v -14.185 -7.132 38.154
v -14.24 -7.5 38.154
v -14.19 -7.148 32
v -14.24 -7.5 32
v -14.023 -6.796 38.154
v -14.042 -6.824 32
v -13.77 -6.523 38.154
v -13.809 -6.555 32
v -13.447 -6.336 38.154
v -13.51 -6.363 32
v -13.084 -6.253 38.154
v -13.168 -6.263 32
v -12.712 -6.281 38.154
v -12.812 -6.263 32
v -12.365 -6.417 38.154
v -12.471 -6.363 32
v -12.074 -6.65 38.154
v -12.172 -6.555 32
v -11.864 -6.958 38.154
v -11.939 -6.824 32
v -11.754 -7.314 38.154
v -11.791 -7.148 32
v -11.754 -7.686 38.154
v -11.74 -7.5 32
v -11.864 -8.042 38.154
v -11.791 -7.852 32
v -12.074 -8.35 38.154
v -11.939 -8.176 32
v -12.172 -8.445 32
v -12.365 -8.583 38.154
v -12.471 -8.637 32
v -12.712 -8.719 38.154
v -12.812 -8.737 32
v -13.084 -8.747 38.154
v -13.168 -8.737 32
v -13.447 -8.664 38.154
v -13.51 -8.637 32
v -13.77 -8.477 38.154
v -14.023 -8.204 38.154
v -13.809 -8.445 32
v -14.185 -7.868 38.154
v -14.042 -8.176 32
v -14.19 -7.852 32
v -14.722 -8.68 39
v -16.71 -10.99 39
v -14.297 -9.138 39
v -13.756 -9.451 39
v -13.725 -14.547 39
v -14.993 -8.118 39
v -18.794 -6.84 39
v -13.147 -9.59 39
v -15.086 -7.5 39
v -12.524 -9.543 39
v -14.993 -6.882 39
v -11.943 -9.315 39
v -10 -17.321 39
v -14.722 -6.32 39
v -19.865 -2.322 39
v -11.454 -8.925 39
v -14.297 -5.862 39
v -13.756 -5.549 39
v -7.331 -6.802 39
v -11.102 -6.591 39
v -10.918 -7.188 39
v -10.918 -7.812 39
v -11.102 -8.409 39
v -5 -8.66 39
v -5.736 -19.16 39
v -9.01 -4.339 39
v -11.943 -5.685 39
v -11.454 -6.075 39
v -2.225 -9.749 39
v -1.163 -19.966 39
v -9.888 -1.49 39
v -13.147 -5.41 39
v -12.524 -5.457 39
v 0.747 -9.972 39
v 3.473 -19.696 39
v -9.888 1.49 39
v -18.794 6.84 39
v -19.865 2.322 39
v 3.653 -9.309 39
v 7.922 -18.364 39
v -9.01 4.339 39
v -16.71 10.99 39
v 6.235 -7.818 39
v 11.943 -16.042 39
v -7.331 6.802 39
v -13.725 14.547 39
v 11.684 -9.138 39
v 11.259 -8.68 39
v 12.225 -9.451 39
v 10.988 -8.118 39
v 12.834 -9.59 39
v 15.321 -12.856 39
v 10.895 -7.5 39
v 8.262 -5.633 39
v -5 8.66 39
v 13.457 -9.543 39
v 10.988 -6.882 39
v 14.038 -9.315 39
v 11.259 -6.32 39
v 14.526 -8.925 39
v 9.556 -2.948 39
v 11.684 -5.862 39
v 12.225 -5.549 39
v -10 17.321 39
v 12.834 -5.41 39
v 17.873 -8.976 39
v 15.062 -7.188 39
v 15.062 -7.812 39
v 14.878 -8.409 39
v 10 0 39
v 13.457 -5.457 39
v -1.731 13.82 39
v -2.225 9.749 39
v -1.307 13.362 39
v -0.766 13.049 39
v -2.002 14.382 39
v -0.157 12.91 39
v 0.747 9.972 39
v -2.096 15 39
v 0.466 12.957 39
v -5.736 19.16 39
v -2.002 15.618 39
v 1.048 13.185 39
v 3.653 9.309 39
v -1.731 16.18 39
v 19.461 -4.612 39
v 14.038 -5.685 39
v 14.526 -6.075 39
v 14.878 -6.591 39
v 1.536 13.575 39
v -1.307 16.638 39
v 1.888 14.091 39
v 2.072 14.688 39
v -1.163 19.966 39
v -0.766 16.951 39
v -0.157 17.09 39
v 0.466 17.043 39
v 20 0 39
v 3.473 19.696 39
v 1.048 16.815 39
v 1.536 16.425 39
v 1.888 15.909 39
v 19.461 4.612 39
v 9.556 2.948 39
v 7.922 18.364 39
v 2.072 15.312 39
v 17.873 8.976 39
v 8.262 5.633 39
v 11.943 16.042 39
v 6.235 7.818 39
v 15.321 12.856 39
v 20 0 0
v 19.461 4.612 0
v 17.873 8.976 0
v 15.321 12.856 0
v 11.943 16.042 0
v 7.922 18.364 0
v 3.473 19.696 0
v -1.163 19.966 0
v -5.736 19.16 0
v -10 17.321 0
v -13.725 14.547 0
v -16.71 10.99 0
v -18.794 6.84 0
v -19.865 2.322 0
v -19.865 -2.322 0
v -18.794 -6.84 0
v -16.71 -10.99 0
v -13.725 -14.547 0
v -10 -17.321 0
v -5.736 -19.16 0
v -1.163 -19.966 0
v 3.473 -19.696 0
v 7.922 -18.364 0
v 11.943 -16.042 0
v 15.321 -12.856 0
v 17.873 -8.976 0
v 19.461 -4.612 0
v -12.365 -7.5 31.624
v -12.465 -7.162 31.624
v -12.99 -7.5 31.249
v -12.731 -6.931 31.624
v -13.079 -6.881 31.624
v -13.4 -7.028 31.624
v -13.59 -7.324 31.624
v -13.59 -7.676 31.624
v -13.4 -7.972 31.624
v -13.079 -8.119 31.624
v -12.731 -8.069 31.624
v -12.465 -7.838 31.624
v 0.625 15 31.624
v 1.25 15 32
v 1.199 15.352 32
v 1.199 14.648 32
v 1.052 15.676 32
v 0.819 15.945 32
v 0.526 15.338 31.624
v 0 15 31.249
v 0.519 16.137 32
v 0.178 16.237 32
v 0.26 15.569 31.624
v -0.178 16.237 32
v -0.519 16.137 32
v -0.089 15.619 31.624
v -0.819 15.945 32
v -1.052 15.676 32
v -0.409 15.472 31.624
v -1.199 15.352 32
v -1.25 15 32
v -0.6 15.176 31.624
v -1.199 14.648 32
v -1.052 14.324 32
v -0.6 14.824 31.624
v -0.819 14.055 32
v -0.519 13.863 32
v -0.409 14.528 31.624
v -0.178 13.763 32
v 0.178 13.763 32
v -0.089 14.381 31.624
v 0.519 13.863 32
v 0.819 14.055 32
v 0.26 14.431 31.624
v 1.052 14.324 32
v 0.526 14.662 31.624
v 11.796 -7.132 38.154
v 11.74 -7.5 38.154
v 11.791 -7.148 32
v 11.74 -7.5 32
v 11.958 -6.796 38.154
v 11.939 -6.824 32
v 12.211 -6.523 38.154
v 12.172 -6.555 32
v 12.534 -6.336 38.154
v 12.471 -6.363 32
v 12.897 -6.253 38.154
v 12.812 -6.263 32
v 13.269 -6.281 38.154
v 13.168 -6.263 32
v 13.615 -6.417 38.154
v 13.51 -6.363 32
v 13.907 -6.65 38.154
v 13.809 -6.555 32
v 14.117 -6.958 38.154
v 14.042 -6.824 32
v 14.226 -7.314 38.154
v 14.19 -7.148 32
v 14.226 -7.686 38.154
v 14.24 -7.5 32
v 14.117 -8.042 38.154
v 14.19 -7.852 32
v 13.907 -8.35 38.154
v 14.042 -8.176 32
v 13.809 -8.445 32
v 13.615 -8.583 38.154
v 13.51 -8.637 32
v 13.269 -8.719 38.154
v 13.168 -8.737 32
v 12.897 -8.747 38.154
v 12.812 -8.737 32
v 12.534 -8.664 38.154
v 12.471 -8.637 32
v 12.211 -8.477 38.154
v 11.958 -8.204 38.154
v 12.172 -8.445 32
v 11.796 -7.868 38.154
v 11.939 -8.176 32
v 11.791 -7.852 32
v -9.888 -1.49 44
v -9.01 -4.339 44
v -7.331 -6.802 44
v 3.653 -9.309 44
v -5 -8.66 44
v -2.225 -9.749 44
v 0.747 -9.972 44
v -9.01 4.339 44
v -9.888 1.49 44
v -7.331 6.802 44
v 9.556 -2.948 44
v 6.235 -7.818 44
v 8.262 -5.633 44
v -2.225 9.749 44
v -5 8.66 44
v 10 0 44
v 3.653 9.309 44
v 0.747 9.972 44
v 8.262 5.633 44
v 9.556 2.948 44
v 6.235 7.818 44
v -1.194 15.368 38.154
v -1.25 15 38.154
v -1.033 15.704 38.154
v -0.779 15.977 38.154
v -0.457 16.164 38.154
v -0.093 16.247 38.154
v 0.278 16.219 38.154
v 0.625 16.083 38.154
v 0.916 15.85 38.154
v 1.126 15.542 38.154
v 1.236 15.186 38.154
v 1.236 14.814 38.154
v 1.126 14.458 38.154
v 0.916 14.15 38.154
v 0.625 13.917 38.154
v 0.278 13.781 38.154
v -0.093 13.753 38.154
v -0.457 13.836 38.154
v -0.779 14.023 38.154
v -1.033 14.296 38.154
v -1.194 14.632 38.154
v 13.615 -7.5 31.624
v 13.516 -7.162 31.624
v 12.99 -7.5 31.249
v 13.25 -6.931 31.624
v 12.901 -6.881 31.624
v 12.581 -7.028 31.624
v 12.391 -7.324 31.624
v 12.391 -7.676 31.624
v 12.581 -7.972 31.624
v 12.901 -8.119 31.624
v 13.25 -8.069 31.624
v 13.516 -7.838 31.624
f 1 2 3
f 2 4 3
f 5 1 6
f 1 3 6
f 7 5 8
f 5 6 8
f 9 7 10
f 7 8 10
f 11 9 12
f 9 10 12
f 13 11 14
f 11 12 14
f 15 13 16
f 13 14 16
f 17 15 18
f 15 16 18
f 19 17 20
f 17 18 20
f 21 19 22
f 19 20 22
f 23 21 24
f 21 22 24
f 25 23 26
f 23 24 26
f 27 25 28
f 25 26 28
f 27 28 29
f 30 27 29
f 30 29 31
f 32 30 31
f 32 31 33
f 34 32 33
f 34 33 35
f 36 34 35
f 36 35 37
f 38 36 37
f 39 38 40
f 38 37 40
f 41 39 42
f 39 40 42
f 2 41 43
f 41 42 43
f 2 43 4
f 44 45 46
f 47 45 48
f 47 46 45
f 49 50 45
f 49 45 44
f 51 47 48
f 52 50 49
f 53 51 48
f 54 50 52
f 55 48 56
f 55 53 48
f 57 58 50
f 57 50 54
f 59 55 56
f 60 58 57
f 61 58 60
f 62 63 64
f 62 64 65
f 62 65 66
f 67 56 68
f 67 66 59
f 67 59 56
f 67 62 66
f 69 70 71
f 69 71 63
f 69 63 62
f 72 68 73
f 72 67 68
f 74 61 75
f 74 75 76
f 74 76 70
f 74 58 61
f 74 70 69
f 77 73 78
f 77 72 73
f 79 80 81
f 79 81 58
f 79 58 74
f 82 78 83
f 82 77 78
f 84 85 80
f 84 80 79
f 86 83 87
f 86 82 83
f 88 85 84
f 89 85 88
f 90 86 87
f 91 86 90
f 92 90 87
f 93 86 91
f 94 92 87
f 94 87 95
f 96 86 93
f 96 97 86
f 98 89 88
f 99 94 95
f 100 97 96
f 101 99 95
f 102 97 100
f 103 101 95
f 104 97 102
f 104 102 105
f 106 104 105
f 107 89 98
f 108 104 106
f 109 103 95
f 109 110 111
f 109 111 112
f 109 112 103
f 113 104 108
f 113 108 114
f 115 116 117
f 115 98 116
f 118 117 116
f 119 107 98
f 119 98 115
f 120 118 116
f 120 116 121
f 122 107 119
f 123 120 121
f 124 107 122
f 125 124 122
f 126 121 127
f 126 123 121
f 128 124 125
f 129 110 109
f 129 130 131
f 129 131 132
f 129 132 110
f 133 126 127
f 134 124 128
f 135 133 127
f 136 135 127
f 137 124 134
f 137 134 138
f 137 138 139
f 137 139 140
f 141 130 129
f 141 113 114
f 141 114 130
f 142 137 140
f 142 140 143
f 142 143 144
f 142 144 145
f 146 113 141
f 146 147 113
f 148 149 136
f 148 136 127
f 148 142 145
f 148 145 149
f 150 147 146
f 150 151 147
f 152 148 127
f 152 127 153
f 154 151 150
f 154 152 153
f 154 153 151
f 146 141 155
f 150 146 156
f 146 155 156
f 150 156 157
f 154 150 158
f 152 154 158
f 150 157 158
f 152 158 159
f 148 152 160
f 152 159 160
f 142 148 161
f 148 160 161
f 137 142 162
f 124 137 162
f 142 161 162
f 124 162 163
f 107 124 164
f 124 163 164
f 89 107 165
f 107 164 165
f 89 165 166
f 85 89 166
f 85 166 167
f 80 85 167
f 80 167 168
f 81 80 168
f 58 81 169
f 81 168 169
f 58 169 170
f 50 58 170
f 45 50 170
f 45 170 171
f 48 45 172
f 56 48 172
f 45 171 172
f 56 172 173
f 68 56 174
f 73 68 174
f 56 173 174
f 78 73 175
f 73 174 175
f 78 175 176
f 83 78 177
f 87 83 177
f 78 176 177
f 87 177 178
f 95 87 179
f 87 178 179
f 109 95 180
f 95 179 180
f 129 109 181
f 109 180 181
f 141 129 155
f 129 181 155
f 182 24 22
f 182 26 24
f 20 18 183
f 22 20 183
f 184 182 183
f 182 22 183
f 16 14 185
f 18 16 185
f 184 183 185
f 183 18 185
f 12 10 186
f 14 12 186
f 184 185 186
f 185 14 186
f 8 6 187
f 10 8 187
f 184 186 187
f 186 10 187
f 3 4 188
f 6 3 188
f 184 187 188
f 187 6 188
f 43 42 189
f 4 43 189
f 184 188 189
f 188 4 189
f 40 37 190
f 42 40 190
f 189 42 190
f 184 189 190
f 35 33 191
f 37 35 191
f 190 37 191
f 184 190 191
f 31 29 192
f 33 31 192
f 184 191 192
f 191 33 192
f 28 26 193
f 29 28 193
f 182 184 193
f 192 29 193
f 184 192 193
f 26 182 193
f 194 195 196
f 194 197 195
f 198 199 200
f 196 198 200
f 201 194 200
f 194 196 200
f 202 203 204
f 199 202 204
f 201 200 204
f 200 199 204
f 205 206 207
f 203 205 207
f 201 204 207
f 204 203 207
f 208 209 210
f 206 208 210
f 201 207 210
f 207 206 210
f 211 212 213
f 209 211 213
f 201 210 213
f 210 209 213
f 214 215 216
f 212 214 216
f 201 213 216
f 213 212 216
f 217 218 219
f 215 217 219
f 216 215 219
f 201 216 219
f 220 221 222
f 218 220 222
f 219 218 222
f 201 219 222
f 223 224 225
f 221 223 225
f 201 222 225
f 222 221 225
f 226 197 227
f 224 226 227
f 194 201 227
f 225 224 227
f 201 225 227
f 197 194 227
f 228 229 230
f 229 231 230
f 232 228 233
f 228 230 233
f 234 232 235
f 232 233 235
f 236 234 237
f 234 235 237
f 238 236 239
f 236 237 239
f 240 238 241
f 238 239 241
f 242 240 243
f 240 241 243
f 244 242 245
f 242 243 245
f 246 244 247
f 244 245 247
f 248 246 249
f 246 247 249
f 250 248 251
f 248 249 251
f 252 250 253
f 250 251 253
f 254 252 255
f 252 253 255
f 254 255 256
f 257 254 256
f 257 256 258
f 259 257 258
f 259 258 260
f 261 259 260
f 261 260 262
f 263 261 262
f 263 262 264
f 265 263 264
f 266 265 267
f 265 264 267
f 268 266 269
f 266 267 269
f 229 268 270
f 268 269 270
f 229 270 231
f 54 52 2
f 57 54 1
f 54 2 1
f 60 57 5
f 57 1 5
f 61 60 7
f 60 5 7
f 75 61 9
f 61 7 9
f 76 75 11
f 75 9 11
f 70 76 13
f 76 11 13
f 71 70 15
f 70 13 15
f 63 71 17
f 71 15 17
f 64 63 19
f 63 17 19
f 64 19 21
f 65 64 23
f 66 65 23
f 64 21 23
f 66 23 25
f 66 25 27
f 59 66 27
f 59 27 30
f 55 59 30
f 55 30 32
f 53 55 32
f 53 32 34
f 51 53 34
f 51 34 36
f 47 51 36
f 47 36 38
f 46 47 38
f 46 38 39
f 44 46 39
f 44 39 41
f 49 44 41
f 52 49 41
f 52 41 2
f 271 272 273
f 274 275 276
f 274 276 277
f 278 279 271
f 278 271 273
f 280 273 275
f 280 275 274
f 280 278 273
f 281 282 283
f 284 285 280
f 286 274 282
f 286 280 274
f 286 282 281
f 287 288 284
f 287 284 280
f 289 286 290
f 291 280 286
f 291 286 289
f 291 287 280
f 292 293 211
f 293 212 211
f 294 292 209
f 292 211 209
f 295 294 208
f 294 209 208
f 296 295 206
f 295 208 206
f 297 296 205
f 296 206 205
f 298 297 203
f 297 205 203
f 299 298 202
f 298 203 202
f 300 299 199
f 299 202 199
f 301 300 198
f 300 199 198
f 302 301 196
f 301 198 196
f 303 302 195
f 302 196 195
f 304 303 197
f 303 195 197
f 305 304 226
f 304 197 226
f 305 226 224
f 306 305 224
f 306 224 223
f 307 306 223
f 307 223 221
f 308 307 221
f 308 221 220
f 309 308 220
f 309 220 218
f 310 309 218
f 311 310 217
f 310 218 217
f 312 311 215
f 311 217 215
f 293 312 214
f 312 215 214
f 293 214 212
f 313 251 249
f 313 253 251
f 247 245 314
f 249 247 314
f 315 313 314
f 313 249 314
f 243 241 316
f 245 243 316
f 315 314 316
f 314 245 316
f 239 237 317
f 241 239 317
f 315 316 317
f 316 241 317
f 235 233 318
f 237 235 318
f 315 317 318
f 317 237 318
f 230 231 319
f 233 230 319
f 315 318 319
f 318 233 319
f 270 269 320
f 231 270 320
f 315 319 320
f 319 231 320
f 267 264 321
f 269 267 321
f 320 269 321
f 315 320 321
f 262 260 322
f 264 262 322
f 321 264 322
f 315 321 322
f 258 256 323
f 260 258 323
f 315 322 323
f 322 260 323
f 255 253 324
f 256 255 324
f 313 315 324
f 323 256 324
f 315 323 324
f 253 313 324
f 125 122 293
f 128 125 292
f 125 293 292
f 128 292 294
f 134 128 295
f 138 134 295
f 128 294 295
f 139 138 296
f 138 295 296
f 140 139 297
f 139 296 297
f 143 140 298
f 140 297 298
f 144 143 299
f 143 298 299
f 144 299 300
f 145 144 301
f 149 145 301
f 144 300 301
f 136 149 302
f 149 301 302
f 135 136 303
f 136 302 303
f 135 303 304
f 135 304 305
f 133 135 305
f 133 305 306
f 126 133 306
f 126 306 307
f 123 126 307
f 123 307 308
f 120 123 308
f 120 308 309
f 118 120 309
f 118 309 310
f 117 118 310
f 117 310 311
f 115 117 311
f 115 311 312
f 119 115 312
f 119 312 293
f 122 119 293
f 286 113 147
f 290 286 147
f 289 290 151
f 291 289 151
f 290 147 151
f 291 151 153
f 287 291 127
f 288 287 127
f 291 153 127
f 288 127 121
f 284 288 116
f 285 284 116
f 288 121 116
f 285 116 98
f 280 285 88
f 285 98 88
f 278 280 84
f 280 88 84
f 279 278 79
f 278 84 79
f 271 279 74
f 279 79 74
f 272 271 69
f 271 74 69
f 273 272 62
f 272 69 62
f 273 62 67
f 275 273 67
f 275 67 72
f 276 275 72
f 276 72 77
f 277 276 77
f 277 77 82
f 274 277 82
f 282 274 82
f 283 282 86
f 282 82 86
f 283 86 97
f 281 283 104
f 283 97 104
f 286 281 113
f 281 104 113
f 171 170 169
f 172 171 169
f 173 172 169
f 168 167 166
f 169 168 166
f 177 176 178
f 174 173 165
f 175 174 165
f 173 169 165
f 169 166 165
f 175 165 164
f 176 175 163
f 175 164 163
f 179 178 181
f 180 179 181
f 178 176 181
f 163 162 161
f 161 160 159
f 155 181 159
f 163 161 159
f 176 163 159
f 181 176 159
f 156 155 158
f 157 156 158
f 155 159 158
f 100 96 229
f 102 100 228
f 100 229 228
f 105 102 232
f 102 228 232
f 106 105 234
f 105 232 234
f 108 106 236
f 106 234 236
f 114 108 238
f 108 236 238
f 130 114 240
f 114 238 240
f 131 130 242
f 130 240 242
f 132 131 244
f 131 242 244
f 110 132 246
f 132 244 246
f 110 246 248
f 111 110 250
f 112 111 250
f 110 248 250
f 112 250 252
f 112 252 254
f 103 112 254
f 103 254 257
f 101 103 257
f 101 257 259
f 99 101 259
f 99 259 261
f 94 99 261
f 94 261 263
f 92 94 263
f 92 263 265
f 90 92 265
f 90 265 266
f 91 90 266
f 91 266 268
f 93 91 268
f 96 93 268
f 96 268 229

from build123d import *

# Parameters (mm, degrees)
F0_R           = 20
F1_DEPTH       = 39
F2_R           = 10
F3_DEPTH       = 5
F5_D           = 2.5
F5_DEPTH       = 7
F5_CSINK_D     = 4.191
F5_CSINK_ANGLE = 90
F5_TIP         = 0.7510757738


with BuildPart() as f1:
    # F0 (on Top) → F1 (new body)
    with BuildSketch(Plane.XY):
        Circle(F0_R)
    extrude(amount=F1_DEPTH)

    # F2 (on face) → F3 (join)
    with BuildSketch(Plane.XY.offset(39)):
        Circle(F2_R)
    extrude(amount=F3_DEPTH)

    # F5
    with Locations(Plane.XY.offset(39)):
        with Locations((-12.9903810568, -7.5), (12.9903810568, -7.5), (0, 15)):
            CounterSinkHole(F5_D / 2, F5_CSINK_D / 2, depth=F5_DEPTH, counter_sink_angle=F5_CSINK_ANGLE)
            with Locations((0, 0, -(F5_DEPTH + F5_TIP / 2))):  # 118° drill point
                Cone(0, F5_D / 2, F5_TIP, mode=Mode.SUBTRACT)


solid = f1.part
